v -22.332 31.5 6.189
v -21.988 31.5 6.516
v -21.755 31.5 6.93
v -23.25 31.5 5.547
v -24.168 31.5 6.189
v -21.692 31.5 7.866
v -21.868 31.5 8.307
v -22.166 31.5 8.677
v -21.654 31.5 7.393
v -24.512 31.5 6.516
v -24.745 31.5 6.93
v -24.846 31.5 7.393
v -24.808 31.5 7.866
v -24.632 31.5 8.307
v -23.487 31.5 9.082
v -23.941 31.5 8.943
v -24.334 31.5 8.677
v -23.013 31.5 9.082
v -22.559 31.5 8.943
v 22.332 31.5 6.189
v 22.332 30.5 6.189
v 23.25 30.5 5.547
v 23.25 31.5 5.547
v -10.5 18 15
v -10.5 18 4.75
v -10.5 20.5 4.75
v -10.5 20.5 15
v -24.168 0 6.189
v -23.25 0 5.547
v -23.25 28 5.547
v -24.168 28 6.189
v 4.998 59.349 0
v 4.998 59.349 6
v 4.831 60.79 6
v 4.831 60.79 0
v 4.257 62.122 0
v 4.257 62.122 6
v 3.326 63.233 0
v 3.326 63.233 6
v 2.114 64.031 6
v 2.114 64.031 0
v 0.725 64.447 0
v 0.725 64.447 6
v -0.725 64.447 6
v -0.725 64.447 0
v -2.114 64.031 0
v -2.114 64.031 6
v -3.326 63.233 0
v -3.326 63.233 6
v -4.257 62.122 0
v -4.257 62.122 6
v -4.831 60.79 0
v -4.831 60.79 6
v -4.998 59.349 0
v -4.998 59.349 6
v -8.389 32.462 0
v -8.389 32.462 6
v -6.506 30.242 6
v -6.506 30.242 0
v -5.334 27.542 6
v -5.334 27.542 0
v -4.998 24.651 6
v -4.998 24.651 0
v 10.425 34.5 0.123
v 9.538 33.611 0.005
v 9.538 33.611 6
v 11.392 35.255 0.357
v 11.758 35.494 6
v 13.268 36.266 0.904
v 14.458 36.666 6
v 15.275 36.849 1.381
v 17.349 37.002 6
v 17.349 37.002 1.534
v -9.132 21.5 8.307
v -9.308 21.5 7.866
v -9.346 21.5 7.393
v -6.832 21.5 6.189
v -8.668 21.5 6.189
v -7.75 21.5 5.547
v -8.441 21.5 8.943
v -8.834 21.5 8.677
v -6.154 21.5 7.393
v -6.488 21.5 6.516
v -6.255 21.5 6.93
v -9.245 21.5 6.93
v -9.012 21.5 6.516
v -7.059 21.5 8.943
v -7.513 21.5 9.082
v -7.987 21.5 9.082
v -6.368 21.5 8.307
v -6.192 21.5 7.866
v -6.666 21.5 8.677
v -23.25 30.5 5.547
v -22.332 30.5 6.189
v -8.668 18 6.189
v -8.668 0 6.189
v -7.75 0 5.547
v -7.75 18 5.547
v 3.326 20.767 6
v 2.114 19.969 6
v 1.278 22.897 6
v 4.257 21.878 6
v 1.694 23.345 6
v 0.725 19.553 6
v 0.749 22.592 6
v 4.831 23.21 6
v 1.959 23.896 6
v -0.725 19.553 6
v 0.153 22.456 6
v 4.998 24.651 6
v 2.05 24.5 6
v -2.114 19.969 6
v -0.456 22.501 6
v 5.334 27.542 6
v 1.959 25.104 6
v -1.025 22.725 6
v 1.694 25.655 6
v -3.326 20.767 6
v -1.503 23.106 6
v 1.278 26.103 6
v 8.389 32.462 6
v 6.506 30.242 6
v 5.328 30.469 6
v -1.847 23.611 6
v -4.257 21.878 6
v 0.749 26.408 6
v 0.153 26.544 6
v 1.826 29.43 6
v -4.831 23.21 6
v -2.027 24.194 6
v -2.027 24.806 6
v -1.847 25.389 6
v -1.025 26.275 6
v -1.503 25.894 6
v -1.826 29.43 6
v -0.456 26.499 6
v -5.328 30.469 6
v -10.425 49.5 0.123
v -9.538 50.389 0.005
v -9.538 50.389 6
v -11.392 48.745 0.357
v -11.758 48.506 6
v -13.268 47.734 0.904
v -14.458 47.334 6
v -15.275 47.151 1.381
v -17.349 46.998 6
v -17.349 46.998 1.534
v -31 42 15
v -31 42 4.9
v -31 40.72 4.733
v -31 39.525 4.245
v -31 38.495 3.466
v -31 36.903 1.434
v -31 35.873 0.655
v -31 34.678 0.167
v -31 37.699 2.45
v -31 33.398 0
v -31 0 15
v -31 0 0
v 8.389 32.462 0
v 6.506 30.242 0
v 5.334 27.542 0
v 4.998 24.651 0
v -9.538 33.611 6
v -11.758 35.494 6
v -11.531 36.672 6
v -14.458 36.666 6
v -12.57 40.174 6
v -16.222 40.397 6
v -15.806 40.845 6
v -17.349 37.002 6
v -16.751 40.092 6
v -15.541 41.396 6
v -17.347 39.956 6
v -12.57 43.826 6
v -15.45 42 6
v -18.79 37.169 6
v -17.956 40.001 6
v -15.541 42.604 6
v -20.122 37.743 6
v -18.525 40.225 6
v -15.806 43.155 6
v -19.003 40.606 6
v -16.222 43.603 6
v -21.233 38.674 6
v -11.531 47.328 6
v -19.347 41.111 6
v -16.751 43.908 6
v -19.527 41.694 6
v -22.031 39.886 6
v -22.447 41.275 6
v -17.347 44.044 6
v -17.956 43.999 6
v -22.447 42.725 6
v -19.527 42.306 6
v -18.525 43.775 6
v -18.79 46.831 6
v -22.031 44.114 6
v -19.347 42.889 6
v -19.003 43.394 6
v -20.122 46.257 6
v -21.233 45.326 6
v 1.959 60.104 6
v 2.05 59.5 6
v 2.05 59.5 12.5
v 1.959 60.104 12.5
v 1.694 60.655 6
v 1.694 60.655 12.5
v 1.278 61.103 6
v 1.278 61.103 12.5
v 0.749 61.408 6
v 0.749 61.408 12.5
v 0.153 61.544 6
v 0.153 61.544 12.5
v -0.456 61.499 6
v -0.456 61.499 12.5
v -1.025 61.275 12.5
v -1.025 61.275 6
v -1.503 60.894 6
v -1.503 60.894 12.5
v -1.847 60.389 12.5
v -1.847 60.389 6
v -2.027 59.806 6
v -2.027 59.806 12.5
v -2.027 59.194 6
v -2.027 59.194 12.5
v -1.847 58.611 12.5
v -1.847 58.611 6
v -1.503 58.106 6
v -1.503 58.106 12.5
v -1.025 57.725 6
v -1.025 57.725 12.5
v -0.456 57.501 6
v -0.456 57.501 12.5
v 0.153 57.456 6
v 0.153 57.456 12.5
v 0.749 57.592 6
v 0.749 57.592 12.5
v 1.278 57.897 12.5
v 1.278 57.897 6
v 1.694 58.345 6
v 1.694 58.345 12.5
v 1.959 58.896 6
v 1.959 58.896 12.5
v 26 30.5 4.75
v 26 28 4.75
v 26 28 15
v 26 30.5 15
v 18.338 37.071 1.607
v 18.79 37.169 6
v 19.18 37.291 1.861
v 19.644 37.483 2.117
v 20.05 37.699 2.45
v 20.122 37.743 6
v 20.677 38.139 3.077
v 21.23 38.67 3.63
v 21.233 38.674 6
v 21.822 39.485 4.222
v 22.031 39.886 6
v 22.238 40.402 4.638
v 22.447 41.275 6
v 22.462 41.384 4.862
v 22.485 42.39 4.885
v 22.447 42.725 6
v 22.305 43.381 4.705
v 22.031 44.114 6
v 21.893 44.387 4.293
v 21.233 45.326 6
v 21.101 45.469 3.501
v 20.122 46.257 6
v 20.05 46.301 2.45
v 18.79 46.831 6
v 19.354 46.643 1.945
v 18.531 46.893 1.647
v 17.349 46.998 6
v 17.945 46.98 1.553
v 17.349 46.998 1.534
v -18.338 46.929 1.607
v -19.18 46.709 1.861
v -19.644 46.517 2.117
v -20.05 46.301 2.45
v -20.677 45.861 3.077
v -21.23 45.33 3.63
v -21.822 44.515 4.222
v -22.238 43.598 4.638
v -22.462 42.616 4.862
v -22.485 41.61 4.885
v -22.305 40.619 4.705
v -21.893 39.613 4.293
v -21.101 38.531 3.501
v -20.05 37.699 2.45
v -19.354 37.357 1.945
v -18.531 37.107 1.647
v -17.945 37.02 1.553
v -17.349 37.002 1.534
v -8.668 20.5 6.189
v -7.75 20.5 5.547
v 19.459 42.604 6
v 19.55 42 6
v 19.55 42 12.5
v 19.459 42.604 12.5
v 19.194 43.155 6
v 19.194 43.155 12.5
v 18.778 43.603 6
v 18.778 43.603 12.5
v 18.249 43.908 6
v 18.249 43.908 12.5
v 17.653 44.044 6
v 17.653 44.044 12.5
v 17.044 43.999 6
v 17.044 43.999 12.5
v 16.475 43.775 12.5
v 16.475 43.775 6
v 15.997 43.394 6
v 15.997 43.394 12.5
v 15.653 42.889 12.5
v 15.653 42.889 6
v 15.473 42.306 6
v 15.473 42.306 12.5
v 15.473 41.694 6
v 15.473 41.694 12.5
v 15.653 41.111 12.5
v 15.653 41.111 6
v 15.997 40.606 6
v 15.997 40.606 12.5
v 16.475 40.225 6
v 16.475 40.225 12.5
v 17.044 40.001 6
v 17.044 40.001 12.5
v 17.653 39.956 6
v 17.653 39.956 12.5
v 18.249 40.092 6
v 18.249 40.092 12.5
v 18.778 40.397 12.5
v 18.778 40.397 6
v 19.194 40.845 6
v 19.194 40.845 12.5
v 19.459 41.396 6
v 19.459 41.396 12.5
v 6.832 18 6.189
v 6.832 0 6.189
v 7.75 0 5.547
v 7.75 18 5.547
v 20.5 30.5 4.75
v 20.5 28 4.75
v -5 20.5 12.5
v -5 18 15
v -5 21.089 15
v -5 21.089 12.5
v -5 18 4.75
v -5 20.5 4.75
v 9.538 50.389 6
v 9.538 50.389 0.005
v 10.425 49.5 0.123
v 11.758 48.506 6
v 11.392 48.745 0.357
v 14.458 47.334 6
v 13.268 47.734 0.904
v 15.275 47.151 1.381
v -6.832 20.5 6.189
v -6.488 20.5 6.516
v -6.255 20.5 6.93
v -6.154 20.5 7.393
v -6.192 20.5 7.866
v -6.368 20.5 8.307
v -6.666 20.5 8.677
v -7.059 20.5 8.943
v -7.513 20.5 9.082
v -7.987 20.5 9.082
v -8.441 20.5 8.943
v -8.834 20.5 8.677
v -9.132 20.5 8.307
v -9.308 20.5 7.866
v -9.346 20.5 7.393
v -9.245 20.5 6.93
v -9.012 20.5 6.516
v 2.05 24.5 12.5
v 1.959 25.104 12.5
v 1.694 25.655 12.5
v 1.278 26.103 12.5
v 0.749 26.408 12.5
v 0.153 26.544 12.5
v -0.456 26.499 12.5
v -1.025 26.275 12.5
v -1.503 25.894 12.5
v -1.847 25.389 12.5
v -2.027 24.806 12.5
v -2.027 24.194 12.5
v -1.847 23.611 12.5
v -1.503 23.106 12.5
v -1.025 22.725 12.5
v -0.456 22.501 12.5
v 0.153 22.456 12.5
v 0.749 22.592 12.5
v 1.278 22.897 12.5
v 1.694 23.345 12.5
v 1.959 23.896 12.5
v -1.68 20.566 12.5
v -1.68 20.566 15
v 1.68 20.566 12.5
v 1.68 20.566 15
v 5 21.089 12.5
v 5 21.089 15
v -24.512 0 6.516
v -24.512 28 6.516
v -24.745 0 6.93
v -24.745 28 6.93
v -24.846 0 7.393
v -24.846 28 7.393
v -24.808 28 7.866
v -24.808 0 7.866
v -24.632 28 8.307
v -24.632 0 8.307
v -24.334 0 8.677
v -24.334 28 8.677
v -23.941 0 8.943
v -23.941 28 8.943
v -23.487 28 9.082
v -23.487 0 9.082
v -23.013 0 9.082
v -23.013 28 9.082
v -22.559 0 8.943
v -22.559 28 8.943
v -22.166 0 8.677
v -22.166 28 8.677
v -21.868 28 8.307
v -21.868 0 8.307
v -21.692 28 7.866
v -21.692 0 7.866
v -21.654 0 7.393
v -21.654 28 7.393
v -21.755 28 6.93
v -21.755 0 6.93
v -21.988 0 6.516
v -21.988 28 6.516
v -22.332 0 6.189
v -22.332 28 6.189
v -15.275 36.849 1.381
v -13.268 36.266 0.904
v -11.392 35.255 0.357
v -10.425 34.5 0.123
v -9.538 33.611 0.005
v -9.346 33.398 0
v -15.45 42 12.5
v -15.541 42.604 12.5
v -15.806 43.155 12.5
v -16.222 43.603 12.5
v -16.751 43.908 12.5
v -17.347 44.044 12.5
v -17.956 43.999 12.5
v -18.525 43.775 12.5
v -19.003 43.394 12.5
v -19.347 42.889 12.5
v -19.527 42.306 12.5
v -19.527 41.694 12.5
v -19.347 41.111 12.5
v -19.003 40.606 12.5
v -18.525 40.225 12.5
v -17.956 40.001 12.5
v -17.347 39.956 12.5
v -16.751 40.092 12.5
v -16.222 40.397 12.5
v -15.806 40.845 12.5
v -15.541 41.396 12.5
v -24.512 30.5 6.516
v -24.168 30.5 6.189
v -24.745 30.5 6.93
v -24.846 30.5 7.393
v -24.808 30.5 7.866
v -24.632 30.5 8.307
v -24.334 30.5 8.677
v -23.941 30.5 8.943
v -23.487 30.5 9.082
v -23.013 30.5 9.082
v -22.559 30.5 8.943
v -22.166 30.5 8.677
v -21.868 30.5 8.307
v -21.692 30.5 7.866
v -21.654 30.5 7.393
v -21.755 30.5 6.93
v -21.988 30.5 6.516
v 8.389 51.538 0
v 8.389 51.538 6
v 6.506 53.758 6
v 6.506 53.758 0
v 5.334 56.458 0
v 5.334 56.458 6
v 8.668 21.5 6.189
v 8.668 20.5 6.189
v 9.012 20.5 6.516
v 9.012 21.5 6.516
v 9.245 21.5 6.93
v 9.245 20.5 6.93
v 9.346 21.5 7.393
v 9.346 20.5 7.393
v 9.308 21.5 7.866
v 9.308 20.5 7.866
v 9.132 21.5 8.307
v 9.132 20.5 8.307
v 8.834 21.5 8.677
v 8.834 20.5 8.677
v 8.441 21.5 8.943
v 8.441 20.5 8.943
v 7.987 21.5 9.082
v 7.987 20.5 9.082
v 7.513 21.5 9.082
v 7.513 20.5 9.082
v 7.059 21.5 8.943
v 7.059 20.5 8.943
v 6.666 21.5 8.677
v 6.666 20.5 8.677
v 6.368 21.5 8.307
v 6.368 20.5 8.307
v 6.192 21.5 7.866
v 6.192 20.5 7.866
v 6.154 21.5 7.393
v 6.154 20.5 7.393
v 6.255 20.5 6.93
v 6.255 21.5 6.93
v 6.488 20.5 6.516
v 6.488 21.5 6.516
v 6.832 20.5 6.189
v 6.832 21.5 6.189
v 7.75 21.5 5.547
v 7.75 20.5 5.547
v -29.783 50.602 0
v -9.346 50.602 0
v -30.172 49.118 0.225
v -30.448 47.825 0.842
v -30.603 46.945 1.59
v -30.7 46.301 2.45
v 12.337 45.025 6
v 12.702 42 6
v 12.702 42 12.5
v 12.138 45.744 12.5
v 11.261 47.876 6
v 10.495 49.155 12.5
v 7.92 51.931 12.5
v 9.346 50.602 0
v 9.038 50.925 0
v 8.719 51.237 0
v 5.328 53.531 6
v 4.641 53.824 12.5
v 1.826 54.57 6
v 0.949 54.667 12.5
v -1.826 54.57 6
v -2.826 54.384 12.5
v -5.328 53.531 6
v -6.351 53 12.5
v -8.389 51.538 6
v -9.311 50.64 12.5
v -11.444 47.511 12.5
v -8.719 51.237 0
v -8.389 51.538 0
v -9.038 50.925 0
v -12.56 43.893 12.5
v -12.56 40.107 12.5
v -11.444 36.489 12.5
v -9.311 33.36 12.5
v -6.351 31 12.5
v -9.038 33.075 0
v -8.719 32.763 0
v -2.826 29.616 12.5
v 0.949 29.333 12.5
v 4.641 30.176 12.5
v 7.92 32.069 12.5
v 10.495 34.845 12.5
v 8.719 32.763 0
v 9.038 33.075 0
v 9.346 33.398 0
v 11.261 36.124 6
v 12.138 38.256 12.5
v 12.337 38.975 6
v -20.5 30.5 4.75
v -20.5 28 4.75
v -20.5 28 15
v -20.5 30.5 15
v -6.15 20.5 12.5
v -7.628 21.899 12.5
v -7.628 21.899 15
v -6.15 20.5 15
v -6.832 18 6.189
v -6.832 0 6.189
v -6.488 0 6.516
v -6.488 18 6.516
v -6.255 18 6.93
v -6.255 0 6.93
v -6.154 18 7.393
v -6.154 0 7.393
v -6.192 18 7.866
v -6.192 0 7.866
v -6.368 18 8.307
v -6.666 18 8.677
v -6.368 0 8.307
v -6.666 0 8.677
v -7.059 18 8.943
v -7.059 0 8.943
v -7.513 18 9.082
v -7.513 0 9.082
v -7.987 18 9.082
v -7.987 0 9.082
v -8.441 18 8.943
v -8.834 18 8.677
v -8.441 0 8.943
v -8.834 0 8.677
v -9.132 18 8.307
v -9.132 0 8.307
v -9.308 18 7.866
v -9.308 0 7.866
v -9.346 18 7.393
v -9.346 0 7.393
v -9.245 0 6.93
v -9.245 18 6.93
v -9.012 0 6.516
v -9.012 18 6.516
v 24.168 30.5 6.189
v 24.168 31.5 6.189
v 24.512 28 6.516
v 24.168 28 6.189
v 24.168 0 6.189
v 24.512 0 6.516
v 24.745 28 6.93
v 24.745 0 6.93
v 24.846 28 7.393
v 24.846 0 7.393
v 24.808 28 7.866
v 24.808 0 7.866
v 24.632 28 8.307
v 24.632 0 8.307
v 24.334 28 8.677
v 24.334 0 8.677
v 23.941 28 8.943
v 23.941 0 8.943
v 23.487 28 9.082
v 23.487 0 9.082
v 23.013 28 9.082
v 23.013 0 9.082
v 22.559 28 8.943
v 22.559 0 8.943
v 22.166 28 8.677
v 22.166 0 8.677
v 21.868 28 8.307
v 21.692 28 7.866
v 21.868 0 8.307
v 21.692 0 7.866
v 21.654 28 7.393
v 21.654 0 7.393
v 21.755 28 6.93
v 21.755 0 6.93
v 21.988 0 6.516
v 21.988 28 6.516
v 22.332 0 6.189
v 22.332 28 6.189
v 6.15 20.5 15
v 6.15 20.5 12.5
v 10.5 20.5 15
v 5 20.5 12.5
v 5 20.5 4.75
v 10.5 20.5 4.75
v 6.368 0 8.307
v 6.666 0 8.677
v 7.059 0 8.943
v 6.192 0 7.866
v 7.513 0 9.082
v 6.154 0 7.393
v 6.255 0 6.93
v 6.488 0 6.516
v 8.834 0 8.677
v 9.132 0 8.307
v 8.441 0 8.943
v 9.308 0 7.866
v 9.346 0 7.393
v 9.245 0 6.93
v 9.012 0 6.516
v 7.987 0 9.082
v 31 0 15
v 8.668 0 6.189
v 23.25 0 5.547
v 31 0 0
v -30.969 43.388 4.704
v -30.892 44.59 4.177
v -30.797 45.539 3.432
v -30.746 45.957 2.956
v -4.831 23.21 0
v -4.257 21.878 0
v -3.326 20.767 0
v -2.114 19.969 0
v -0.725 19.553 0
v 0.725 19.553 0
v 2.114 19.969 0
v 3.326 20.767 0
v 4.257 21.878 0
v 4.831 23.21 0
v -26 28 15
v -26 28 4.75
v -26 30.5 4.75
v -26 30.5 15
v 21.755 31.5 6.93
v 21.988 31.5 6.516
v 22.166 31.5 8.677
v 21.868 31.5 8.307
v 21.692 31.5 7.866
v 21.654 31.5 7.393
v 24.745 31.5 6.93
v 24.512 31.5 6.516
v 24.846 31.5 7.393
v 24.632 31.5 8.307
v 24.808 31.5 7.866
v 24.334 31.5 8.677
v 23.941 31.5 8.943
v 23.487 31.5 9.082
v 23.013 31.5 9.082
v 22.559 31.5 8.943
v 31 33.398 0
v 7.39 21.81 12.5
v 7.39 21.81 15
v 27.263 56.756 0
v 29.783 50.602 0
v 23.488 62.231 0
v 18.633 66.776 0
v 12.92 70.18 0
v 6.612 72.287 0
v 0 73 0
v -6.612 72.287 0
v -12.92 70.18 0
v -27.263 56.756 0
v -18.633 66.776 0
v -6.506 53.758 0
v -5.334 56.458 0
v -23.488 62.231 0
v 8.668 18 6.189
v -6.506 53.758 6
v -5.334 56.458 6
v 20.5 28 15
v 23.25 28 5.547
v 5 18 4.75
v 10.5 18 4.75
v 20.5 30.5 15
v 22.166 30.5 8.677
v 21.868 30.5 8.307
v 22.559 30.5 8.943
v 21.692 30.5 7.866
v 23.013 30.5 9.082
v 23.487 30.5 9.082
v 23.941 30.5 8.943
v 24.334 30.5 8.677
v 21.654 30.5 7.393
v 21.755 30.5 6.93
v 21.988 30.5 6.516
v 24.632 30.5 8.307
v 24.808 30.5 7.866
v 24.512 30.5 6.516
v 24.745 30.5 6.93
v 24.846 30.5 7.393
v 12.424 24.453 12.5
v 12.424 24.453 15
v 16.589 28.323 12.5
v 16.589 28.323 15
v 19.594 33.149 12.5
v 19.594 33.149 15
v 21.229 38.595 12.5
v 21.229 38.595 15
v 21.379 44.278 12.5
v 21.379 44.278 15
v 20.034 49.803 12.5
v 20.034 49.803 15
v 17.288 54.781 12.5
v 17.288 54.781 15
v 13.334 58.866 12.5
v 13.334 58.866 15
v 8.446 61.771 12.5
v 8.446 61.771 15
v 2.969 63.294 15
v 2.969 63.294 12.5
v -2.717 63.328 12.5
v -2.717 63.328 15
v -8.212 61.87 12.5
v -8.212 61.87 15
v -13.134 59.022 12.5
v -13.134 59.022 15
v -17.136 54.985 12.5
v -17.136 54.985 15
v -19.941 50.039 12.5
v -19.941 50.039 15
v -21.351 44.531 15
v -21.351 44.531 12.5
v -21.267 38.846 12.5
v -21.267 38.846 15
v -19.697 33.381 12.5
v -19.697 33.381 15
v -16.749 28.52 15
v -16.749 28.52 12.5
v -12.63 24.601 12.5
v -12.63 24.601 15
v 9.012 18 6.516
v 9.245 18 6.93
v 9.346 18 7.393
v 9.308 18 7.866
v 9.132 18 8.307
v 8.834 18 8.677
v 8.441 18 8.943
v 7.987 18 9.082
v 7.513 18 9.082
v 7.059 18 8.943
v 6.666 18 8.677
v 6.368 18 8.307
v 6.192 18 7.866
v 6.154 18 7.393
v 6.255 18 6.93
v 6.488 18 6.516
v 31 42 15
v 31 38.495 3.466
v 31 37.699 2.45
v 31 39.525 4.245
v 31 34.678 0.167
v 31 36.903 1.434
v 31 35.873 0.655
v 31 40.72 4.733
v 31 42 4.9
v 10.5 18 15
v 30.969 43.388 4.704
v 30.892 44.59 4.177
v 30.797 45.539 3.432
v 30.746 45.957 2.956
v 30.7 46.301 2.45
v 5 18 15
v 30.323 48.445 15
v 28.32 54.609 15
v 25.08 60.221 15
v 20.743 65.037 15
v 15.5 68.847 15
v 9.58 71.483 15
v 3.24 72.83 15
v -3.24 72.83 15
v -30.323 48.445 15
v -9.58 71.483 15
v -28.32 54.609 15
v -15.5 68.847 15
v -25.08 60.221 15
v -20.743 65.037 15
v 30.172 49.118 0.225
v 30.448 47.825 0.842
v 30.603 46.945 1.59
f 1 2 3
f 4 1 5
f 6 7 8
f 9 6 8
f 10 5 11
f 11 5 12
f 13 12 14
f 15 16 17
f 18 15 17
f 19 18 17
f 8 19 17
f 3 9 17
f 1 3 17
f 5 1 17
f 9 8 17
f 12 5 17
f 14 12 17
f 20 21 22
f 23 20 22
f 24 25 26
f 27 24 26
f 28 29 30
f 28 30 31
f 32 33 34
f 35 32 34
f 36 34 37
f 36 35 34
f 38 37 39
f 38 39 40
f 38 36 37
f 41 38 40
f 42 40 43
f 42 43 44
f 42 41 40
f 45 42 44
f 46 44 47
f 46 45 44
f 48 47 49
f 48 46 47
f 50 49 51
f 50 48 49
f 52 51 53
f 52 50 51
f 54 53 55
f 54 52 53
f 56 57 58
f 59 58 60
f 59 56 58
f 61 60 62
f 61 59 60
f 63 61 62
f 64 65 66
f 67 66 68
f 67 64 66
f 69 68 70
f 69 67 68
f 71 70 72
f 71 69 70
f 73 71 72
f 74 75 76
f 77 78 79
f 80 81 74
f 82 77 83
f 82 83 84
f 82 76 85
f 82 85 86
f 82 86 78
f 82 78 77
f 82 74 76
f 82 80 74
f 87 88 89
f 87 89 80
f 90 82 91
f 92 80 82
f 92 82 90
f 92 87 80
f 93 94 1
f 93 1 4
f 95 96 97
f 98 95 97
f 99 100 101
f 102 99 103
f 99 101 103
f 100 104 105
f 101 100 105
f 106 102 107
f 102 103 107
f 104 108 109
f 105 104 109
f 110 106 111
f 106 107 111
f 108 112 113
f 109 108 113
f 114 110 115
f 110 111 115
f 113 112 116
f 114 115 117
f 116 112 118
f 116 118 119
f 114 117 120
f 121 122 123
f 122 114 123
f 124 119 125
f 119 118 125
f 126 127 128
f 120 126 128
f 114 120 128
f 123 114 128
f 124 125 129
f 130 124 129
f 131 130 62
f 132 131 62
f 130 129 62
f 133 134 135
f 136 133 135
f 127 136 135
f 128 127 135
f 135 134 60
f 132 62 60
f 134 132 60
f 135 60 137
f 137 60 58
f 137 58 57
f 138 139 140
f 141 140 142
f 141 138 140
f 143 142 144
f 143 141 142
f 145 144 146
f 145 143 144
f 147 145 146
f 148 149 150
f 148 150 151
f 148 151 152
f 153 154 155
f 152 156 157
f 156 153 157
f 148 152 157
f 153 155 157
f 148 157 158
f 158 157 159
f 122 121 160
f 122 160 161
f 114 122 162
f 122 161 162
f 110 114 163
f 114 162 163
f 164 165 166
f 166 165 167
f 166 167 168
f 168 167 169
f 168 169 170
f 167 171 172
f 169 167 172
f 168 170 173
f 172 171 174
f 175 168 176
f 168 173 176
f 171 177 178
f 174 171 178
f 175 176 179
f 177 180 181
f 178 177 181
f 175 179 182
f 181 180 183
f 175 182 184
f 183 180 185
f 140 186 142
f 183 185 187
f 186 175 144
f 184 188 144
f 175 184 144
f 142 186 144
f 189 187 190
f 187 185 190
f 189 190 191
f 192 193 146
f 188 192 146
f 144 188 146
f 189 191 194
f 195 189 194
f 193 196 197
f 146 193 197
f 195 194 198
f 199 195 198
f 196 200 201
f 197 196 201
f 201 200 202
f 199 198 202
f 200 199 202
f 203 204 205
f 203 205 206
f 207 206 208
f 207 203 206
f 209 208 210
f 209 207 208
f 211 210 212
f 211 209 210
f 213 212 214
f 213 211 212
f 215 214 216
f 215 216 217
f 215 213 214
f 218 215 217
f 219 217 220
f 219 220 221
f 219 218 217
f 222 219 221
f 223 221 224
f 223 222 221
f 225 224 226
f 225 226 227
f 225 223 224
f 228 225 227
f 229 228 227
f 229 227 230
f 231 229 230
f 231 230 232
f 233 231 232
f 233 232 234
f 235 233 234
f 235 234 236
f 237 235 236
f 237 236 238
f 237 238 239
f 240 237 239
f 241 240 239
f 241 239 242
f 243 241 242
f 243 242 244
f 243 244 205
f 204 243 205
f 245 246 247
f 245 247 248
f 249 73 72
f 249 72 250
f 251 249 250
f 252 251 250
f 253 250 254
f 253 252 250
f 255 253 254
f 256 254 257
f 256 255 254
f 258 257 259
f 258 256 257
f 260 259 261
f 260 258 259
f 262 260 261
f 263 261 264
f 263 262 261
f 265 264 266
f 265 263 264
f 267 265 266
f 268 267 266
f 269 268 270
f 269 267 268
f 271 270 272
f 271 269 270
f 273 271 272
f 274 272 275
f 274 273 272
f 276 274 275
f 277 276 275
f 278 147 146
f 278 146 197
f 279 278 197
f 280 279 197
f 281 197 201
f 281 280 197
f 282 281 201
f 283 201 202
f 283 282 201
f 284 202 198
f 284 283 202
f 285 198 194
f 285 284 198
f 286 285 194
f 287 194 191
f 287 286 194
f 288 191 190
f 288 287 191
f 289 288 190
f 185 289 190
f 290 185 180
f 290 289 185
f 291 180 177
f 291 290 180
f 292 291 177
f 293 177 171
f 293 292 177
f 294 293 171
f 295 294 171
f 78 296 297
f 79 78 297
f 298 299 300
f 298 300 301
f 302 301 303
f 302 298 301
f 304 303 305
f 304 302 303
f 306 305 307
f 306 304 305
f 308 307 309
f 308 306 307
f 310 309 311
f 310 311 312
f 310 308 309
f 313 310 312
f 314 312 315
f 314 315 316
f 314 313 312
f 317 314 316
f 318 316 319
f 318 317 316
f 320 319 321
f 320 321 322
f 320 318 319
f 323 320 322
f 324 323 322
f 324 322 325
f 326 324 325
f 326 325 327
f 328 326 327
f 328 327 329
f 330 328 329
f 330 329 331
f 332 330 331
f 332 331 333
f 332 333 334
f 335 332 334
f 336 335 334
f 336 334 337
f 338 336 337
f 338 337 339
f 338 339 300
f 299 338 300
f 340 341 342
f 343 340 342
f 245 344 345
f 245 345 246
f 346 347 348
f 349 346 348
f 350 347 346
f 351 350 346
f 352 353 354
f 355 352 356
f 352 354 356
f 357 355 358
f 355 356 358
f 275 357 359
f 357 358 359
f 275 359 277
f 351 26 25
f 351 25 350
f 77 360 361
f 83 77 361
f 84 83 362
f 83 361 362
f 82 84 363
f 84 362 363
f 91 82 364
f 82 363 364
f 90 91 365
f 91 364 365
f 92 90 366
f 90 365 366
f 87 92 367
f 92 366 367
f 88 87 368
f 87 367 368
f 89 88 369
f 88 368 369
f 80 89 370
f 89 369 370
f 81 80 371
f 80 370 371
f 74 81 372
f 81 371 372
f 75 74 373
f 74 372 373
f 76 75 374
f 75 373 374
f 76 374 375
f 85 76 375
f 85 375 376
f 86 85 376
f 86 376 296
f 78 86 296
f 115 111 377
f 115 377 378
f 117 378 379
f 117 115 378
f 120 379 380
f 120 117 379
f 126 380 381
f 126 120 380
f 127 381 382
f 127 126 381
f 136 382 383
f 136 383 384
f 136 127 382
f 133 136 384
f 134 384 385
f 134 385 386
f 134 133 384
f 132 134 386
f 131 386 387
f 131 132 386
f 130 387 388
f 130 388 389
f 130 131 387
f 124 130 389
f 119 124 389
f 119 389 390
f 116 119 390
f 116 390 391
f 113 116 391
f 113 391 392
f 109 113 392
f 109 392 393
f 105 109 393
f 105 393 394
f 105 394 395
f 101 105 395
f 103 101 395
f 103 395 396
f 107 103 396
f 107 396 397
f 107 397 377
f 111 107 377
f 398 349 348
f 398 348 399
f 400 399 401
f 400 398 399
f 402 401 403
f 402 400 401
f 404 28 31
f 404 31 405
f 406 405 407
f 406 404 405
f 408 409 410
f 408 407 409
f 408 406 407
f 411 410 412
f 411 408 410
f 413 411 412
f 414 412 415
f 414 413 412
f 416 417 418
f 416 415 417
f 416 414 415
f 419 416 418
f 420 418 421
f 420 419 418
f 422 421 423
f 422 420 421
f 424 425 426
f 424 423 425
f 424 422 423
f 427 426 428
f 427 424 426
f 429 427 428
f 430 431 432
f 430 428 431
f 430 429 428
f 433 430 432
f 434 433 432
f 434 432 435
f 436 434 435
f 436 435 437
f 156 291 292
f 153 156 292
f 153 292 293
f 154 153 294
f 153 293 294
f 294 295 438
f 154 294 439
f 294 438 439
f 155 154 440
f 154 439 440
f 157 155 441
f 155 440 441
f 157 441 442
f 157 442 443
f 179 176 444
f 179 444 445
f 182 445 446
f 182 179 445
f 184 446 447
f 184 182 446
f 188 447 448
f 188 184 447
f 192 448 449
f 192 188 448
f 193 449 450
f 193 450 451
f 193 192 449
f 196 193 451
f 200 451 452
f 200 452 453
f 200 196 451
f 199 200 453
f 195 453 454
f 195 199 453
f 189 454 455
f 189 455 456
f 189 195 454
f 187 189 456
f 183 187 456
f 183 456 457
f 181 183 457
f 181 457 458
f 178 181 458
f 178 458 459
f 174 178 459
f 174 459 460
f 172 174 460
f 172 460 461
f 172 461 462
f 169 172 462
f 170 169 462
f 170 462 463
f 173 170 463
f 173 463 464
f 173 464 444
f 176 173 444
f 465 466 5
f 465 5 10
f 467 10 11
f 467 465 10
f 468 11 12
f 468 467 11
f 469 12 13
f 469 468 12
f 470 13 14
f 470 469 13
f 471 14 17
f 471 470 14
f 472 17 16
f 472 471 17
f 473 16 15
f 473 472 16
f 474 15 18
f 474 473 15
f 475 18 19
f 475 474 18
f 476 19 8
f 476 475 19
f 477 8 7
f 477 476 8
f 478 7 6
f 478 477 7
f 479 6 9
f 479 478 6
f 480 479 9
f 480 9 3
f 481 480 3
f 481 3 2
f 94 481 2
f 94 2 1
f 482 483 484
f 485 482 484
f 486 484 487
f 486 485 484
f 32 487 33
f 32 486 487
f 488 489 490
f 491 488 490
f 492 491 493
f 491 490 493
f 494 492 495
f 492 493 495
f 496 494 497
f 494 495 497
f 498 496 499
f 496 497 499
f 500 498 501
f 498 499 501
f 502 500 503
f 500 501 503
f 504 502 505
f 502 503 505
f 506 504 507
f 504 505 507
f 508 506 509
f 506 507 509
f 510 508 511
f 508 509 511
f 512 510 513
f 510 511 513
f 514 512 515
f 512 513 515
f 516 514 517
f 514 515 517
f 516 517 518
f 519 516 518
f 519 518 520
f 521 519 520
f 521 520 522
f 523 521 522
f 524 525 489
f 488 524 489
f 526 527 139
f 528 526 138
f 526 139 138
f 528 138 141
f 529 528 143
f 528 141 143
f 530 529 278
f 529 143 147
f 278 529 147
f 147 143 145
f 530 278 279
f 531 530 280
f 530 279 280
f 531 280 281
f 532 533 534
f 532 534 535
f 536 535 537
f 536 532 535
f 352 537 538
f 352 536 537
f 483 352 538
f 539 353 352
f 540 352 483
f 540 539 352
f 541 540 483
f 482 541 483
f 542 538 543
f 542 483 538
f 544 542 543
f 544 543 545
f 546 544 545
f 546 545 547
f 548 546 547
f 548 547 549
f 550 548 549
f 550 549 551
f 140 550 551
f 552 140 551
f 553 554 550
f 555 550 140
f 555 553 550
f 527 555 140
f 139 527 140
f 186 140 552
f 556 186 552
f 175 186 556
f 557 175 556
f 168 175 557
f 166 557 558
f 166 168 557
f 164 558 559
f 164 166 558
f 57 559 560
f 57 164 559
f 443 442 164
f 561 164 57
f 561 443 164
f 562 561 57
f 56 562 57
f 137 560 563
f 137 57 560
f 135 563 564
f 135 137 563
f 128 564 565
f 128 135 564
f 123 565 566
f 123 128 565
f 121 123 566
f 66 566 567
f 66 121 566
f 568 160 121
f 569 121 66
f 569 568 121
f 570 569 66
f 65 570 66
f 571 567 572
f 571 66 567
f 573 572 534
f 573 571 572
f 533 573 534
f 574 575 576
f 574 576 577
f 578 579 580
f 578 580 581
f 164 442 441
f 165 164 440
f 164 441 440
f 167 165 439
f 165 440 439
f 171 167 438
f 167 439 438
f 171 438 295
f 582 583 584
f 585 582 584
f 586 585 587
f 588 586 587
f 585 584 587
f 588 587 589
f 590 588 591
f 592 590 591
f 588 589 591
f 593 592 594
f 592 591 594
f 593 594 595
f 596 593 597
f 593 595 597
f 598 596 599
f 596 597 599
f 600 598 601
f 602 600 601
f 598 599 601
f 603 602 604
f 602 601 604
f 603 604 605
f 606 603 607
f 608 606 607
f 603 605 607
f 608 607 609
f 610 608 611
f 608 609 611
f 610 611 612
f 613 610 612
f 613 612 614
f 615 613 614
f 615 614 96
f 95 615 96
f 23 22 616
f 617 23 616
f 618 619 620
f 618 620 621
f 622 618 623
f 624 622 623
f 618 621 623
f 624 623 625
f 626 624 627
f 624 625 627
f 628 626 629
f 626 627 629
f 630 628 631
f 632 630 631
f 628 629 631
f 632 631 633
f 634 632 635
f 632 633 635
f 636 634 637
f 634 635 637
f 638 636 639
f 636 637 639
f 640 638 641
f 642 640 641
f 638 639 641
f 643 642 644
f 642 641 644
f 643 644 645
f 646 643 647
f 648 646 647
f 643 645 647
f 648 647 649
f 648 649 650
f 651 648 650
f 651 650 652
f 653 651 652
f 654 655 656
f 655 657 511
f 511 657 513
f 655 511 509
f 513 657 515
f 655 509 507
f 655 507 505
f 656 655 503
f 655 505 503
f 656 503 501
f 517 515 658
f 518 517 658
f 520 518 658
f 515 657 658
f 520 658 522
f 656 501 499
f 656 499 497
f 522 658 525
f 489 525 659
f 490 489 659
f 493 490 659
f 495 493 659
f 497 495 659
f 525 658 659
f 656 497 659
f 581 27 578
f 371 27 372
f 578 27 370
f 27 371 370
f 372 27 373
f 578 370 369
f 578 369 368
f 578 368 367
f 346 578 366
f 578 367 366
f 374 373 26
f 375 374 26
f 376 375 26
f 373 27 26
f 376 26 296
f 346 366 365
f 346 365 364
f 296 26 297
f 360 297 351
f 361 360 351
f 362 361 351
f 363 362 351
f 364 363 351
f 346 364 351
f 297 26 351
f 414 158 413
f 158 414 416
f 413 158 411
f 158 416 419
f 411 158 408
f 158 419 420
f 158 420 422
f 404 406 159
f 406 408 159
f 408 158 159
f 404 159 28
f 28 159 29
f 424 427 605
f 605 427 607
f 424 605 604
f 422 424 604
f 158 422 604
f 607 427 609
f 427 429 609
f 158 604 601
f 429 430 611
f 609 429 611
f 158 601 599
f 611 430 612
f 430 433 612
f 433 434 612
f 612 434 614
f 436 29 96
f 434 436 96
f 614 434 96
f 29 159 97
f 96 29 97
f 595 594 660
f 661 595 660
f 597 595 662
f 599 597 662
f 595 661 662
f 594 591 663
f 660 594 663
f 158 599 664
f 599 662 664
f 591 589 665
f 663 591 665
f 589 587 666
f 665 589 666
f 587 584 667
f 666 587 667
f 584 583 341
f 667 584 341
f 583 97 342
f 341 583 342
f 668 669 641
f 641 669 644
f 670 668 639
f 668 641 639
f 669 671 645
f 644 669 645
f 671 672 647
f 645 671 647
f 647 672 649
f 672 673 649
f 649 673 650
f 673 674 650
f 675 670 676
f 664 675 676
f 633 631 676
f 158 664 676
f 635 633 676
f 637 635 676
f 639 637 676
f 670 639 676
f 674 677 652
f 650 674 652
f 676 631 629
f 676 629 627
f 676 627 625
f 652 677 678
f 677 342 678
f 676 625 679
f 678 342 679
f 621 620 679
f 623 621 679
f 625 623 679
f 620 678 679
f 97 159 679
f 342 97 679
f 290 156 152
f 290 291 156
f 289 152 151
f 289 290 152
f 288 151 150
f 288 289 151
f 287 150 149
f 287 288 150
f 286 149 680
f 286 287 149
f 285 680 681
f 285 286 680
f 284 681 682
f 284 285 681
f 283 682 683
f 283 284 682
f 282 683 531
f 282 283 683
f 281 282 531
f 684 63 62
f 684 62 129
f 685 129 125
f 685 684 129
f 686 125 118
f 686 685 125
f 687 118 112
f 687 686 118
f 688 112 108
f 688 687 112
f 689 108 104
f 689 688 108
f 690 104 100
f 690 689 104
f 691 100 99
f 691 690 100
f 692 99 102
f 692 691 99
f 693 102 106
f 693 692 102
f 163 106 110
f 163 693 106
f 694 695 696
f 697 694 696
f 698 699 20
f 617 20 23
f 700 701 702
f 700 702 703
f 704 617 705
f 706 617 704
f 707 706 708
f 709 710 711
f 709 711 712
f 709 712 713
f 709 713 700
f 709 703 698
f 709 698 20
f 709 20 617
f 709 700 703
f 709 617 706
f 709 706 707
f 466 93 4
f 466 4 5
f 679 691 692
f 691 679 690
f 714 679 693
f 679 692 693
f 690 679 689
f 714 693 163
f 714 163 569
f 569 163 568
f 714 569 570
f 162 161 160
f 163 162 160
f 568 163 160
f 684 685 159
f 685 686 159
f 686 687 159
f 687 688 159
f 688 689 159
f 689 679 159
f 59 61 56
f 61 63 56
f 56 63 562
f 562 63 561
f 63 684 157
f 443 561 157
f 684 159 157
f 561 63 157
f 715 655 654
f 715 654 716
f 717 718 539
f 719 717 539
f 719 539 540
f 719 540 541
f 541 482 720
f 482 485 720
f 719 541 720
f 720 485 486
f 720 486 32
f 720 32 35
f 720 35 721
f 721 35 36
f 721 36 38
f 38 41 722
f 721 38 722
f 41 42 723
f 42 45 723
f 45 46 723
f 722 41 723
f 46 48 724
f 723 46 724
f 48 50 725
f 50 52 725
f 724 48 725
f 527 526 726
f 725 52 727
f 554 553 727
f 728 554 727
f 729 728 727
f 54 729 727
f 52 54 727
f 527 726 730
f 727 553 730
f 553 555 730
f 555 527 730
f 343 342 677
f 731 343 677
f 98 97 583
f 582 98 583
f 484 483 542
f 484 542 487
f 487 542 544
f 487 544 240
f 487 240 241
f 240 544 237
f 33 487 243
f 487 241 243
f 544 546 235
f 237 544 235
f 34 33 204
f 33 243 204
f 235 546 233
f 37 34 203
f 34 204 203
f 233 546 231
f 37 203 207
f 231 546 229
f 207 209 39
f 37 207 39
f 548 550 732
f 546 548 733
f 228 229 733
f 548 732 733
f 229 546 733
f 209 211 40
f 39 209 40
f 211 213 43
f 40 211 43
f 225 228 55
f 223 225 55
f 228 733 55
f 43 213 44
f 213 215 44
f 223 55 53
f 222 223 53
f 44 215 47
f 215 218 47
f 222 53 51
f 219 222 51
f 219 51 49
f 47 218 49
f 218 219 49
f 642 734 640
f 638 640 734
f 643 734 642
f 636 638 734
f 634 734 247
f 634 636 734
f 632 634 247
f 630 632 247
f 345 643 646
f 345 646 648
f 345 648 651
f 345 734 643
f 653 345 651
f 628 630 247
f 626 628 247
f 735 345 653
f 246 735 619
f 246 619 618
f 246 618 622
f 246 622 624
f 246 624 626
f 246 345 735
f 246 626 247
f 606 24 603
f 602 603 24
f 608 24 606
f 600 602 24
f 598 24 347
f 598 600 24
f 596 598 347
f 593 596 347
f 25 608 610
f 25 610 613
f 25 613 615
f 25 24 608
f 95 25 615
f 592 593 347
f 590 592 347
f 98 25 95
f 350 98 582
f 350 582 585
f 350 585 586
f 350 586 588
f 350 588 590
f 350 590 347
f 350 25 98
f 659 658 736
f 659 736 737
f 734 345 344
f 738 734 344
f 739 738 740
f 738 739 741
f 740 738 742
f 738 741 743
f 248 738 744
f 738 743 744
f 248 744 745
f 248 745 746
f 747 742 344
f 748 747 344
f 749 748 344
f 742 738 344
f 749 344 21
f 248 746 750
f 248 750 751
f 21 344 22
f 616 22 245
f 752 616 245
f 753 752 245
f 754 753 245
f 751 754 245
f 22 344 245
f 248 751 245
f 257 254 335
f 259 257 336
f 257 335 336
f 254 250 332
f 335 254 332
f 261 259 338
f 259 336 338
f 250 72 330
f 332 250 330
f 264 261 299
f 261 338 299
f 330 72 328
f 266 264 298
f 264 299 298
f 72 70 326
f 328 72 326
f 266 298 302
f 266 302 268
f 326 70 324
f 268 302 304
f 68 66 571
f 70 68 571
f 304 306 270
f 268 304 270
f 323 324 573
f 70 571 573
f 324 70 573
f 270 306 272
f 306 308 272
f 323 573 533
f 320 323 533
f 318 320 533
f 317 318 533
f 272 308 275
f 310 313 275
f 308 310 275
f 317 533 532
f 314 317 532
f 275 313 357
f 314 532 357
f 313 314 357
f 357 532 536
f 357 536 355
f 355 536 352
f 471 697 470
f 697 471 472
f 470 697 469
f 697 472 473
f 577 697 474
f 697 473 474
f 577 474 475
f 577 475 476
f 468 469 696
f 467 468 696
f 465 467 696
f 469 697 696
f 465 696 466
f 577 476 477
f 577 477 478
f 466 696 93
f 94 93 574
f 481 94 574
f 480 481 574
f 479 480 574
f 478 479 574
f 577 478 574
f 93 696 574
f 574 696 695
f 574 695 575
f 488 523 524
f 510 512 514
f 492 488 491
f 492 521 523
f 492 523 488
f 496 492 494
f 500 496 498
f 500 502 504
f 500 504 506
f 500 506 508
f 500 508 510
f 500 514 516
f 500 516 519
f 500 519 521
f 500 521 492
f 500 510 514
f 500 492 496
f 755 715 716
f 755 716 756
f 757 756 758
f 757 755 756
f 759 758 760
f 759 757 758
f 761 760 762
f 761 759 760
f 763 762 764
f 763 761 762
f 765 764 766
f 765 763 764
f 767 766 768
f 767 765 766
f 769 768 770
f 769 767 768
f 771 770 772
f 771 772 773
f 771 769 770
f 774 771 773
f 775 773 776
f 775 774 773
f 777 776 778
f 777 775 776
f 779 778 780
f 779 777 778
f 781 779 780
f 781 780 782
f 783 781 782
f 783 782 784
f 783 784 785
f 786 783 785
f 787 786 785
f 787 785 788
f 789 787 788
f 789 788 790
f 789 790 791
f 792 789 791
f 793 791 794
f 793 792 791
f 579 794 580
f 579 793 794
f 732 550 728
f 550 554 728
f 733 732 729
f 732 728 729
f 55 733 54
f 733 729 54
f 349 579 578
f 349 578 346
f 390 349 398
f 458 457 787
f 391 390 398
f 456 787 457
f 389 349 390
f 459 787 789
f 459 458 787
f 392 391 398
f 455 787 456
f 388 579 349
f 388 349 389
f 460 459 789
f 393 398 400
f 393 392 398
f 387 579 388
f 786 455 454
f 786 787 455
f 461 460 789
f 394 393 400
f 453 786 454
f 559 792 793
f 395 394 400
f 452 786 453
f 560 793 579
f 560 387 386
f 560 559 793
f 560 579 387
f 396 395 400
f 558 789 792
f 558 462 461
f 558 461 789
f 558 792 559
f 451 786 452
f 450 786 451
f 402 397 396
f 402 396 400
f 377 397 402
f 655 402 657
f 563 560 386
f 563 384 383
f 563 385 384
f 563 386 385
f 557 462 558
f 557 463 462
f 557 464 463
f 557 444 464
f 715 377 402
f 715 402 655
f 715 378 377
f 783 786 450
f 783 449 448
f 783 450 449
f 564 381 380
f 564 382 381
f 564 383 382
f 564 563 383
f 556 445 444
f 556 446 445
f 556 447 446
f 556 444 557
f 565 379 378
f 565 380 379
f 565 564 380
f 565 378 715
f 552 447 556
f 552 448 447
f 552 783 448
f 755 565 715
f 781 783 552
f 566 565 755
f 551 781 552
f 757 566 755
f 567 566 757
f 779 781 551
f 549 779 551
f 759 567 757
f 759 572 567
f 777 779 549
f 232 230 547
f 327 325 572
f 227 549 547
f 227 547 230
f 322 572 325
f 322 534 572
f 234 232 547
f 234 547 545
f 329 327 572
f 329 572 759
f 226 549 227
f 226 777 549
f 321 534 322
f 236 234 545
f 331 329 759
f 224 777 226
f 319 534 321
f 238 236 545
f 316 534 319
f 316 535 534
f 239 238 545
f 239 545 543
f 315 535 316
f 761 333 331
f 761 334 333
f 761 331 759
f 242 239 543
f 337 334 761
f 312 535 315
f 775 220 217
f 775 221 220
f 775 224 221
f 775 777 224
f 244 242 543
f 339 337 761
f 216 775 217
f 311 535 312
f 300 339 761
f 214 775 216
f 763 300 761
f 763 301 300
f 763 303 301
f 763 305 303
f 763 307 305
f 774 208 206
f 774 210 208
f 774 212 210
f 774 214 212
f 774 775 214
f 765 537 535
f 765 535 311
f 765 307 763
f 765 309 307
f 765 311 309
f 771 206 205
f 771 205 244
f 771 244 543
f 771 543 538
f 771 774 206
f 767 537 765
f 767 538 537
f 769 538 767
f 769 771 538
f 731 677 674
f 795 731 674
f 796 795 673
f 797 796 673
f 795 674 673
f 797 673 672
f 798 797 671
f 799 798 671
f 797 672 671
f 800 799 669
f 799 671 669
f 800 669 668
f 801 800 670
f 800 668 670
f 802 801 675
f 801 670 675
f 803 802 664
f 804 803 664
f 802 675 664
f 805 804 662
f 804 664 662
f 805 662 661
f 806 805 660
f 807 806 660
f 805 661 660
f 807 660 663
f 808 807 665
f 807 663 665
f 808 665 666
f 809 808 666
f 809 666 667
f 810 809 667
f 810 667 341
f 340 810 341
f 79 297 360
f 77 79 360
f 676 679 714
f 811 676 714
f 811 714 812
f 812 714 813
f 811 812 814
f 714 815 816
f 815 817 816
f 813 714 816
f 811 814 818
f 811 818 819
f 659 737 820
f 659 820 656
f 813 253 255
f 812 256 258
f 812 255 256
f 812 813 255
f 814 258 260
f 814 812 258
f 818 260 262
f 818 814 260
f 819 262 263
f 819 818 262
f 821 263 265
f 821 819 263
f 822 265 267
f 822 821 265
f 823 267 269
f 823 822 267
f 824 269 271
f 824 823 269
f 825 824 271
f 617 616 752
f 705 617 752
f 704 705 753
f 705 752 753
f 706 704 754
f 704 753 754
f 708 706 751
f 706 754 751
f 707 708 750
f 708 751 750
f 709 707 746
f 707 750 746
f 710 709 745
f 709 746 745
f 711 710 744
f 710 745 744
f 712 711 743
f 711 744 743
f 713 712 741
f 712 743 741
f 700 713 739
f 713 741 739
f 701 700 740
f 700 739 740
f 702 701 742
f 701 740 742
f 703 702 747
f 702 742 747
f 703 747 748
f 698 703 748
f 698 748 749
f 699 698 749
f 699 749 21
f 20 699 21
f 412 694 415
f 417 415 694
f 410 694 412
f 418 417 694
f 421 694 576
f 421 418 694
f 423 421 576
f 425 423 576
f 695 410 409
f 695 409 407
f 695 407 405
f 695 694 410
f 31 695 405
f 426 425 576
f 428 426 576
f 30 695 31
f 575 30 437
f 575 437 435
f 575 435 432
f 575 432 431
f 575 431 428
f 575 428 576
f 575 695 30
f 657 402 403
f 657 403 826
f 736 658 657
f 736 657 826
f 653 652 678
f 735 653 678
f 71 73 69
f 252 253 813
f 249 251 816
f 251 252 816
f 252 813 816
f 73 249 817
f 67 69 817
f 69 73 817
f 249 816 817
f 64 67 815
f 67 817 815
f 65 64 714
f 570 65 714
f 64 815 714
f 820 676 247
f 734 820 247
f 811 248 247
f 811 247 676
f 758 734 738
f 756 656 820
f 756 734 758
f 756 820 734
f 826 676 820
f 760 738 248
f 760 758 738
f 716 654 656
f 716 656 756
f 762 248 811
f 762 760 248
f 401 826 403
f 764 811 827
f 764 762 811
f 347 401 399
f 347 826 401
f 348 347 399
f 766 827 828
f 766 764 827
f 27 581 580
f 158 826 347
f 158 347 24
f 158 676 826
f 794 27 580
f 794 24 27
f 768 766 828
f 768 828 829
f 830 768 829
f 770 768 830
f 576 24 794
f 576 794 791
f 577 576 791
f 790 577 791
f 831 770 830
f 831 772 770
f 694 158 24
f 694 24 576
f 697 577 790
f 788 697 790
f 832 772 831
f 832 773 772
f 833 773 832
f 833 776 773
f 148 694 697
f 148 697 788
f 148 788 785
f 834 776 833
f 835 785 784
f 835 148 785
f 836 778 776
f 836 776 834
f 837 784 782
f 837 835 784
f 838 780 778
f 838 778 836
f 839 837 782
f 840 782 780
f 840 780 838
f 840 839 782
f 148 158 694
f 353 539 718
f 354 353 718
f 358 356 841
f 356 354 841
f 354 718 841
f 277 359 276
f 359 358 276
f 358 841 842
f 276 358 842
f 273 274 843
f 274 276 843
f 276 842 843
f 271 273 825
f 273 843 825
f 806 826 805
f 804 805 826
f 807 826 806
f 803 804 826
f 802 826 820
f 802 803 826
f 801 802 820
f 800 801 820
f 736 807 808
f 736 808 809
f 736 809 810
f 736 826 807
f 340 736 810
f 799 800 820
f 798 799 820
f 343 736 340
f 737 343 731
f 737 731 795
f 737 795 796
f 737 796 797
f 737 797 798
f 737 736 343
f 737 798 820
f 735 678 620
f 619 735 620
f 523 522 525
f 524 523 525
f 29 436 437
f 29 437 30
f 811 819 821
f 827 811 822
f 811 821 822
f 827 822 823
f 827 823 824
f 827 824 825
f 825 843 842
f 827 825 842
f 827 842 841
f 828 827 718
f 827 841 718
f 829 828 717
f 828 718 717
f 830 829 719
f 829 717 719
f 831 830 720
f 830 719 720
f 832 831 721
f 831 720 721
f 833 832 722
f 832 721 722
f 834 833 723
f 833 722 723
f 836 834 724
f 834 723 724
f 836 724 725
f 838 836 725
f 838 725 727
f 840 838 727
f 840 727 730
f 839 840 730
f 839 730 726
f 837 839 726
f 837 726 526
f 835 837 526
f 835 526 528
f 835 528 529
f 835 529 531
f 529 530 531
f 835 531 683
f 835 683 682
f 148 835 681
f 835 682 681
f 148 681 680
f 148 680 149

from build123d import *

# Parameters (mm, degrees)
SKETCH1_R                = 12.702118755
BOSS_EXTRUDE1_DEPTH      = 15
SKETCH1_3_R              = 5
CUT_EXTRUDE1_DEPTH       = 6
CUT_EXTRUDE3_DEPTH       = 81.715549927
CUT_EXTRUDE3_DEPTH_BACK  = 81.715549927
SKETCH1_4_R              = 2.05
FILLET1_R                = 10
CUT_EXTRUDE12_DEPTH      = 81.715550074
CUT_EXTRUDE12_DEPTH_BACK = 2.75
CUT_EXTRUDE12_START      = -7.5
SKETCH3_W                = 5.5
SKETCH3_H                = 2.5
CUT_EXTRUDE13_DEPTH      = 31.5
CUT_EXTRUDE14_DEPTH      = 21.5
CUT_EXTRUDE15_DEPTH      = 97.943282542
CUT_EXTRUDE15_DEPTH_BACK = 97.943282542
SKETCH4_R                = 5
FILLET2_R                = 5
CUT_EXTRUDE17_START      = -2.5
SKETCH6_R                = 2.05
SKETCH6_R_2              = 12.702118755
CUT_EXTRUDE17_DEPTH      = 2.5


with BuildPart() as part:
    # Sketch1 → Boss-Extrude1 (new body)
    with BuildSketch(Plane(origin=(0, 0, 0), x_dir=(0, 1, 0), z_dir=(0, 0, 1))):
        with BuildLine():
            Line((0, 31), (0, -31))
            Line((0, -31), (42, -31))
            ThreePointArc((42, -31), (73, 0), (42, 31))
            Line((42, 31), (0, 31))
        make_face()
        with Locations(Location((42, 0, 0), (0, 0, 270))):
            Circle(SKETCH1_R, mode=Mode.SUBTRACT)
    extrude(amount=BOSS_EXTRUDE1_DEPTH)

    # Sketch1<3> → Cut-Extrude1 (cut)
    with BuildSketch(Plane(origin=(0, 0, 0), x_dir=(0, 1, 0), z_dir=(0, 0, 1))):
        with Locations((59.5, 0)):
            Circle(SKETCH1_3_R)
        with Locations((42, -17.5)):
            Circle(SKETCH1_3_R)
        with Locations((24.5, 0)):
            Circle(SKETCH1_3_R)
        with Locations((42, 17.5)):
            Circle(SKETCH1_3_R)
    extrude(amount=CUT_EXTRUDE1_DEPTH, mode=Mode.SUBTRACT)

    # Sketch1<4> → Cut-Extrude3 (cut, two sides: drawn at the far end of the back side and taken through both)
    with BuildSketch(Plane(origin=(0, 0, 0), x_dir=(0, 1, 0), z_dir=(0, 0, 1)).offset(-CUT_EXTRUDE3_DEPTH_BACK)):
        with Locations(Location((59.5, 0, 0), (0, 0, 270))):
            Circle(SKETCH1_4_R)
        with Locations(Location((42, -17.5, 0), (0, 0, 270))):
            Circle(SKETCH1_4_R)
        with Locations(Location((24.5, 0, 0), (0, 0, 270))):
            Circle(SKETCH1_4_R)
        with Locations(Location((42, 17.5, 0), (0, 0, 270))):
            Circle(SKETCH1_4_R)
    extrude(amount=CUT_EXTRUDE3_DEPTH + CUT_EXTRUDE3_DEPTH_BACK, mode=Mode.SUBTRACT)

    # Fillet1
    fillet1_edges = [part.edges().sort_by_distance(p)[0] for p in [
        (-1.197579289, 29.354462261, 3),
        (1.197579289, 29.354462261, 3),
        (-12.645537739, 43.197579289, 3),
        (-12.645537739, 40.802420711, 3),
        (1.197579289, 54.645537739, 3),
        (-1.197579289, 54.645537739, 3),
        (12.645537739, 40.802420711, 3),
        (12.645537739, 43.197579289, 3),
    ]]
    fillet(fillet1_edges, radius=FILLET1_R)

    # Sketch3 → Cut-Extrude12 (cut, two sides: drawn at the far end of the back side and taken through both)
    with BuildSketch(Plane.XY.offset(15).offset(CUT_EXTRUDE12_START - CUT_EXTRUDE12_DEPTH_BACK)):
        with Locations((-23.25, 29.25)):
            Rectangle(SKETCH3_W, SKETCH3_H)
        with Locations((-7.75, 19.25)):
            Rectangle(SKETCH3_W, SKETCH3_H)
        with Locations((7.75, 19.25)):
            Rectangle(SKETCH3_W, SKETCH3_H)
        with Locations((23.25, 29.25)):
            Rectangle(SKETCH3_W, SKETCH3_H)
    extrude(amount=CUT_EXTRUDE12_DEPTH + CUT_EXTRUDE12_DEPTH_BACK, mode=Mode.SUBTRACT)

    # Sketch2 → Cut-Extrude13 (cut)
    with BuildSketch(Plane.XZ):
        with BuildLine():
            Line((-22.332277702, 6.189356729), (-23.25, 5.546760658))
            Line((-23.25, 5.546760658), (-24.167722298, 6.189356729))
            ThreePointArc((-24.167722298, 6.189356729), (-23.25, 9.1), (-22.332277702, 6.189356729))
        make_face()
        with BuildLine():
            Line((22.332277702, 6.189356729), (23.25, 5.546760658))
            Line((23.25, 5.546760658), (24.167722298, 6.189356729))
            ThreePointArc((24.167722298, 6.189356729), (23.25, 9.1), (22.332277702, 6.189356729))
        make_face()
    extrude(amount=-CUT_EXTRUDE13_DEPTH, mode=Mode.SUBTRACT)

    # Sketch2<3> → Cut-Extrude14 (cut)
    with BuildSketch(Plane.XZ):
        with BuildLine():
            Line((-8.667722298, 6.189356729), (-7.75, 5.546760658))
            Line((-7.75, 5.546760658), (-6.832277702, 6.189356729))
            ThreePointArc((-6.832277702, 6.189356729), (-7.75, 9.1), (-8.667722298, 6.189356729))
        make_face()
        with BuildLine():
            Line((6.832277702, 6.189356729), (7.75, 5.546760658))
            Line((7.75, 5.546760658), (8.667722298, 6.189356729))
            ThreePointArc((8.667722298, 6.189356729), (7.75, 9.1), (6.832277702, 6.189356729))
        make_face()
    extrude(amount=-CUT_EXTRUDE14_DEPTH, mode=Mode.SUBTRACT)

    # Sketch4 → Cut-Extrude15 (cut, two sides: drawn at the far end of the back side and taken through both)
    with BuildSketch(Plane(origin=(-31, 0, 0), x_dir=(0, -1, 0), z_dir=(-1, 0, 0)).offset(-CUT_EXTRUDE15_DEPTH_BACK)):
        with Locations((-42, -0.1)):
            Circle(SKETCH4_R)
    extrude(amount=CUT_EXTRUDE15_DEPTH + CUT_EXTRUDE15_DEPTH_BACK, mode=Mode.SUBTRACT)

    # Fillet2
    # the kernel refuses this fillet: 5 mm, written as the material it takes off along each edge
    with BuildSketch(Plane(origin=(-8.593139727, 37.0010001, 0), x_dir=(0, 0.2740416493582673, 0.9617178247370693), z_dir=(-1, 0, 0)), Plane(origin=(40.006860273, 37.0010001, 0), x_dir=(0, 0.2740416493582673, 0.9617178247370693), z_dir=(-1, 0, 0))) as fillet2_piece_1:
        with BuildLine():
            CenterArc((3.821287186, -4.835031475), FILLET2_R, 104.758918872, 59.336170258)
            Line((-0.987301938, -3.464823228), (0, 0))
            ThreePointArc((0, 0), (1.273762395, -0.164968525), (2.547524791, 0))
        make_face()
    extrude(amount=31.413720546, mode=Mode.SUBTRACT)
    with BuildSketch(Plane(origin=(-8.593139727, 46.9989999, 0), x_dir=(0, 1, 0), z_dir=(-1, 0, 0)), Plane(origin=(39.601140784, 46.9989999, 0), x_dir=(0, 1, 0), z_dir=(-1, 0, 0))) as fillet2_piece_2:
        with BuildLine():
            CenterArc((3.602744109, -5), FILLET2_R, 90, 59.336170258)
            ThreePointArc((-0.698127895, -2.45), (-0.190410776, -1.270208247), (0, 0))
            Line((0, 0), (3.602744109, 0))
        make_face()
    extrude(amount=31.008001057, mode=Mode.SUBTRACT)

    # Sketch6 → Cut-Extrude17 (cut)
    with BuildSketch(Plane.XY.offset(15).offset(CUT_EXTRUDE17_START)):
        with BuildLine():
            Line((-7.62767837, 21.898544265), (-6.15, 20.5))
            Line((-6.15, 20.5), (-5, 20.5))
            Line((-5, 20.5), (-5, 21.089476334))
            ThreePointArc((-5, 21.089476334), (0, 20.5), (5, 21.089476334))
            Line((5, 21.089476334), (5, 20.5))
            Line((5, 20.5), (6.15, 20.5))
            Line((6.15, 20.5), (7.389699175, 21.809845318))
            ThreePointArc((7.389699175, 21.809845318), (0.126985826, 63.499624987), (-7.62767837, 21.898544265))
        make_face()
        with Locations((0, 59.5)):
            Circle(SKETCH6_R, mode=Mode.SUBTRACT)
        with Locations((0, 24.5)):
            Circle(SKETCH6_R, mode=Mode.SUBTRACT)
        with Locations((-17.5, 42)):
            Circle(SKETCH6_R, mode=Mode.SUBTRACT)
        with Locations(Location((0, 42, 0), (0, 0, 221.332642507))):
            Circle(SKETCH6_R_2, mode=Mode.SUBTRACT)
        with Locations((17.5, 42)):
            Circle(SKETCH6_R, mode=Mode.SUBTRACT)
    extrude(amount=CUT_EXTRUDE17_DEPTH, mode=Mode.SUBTRACT)


solid = part.part
